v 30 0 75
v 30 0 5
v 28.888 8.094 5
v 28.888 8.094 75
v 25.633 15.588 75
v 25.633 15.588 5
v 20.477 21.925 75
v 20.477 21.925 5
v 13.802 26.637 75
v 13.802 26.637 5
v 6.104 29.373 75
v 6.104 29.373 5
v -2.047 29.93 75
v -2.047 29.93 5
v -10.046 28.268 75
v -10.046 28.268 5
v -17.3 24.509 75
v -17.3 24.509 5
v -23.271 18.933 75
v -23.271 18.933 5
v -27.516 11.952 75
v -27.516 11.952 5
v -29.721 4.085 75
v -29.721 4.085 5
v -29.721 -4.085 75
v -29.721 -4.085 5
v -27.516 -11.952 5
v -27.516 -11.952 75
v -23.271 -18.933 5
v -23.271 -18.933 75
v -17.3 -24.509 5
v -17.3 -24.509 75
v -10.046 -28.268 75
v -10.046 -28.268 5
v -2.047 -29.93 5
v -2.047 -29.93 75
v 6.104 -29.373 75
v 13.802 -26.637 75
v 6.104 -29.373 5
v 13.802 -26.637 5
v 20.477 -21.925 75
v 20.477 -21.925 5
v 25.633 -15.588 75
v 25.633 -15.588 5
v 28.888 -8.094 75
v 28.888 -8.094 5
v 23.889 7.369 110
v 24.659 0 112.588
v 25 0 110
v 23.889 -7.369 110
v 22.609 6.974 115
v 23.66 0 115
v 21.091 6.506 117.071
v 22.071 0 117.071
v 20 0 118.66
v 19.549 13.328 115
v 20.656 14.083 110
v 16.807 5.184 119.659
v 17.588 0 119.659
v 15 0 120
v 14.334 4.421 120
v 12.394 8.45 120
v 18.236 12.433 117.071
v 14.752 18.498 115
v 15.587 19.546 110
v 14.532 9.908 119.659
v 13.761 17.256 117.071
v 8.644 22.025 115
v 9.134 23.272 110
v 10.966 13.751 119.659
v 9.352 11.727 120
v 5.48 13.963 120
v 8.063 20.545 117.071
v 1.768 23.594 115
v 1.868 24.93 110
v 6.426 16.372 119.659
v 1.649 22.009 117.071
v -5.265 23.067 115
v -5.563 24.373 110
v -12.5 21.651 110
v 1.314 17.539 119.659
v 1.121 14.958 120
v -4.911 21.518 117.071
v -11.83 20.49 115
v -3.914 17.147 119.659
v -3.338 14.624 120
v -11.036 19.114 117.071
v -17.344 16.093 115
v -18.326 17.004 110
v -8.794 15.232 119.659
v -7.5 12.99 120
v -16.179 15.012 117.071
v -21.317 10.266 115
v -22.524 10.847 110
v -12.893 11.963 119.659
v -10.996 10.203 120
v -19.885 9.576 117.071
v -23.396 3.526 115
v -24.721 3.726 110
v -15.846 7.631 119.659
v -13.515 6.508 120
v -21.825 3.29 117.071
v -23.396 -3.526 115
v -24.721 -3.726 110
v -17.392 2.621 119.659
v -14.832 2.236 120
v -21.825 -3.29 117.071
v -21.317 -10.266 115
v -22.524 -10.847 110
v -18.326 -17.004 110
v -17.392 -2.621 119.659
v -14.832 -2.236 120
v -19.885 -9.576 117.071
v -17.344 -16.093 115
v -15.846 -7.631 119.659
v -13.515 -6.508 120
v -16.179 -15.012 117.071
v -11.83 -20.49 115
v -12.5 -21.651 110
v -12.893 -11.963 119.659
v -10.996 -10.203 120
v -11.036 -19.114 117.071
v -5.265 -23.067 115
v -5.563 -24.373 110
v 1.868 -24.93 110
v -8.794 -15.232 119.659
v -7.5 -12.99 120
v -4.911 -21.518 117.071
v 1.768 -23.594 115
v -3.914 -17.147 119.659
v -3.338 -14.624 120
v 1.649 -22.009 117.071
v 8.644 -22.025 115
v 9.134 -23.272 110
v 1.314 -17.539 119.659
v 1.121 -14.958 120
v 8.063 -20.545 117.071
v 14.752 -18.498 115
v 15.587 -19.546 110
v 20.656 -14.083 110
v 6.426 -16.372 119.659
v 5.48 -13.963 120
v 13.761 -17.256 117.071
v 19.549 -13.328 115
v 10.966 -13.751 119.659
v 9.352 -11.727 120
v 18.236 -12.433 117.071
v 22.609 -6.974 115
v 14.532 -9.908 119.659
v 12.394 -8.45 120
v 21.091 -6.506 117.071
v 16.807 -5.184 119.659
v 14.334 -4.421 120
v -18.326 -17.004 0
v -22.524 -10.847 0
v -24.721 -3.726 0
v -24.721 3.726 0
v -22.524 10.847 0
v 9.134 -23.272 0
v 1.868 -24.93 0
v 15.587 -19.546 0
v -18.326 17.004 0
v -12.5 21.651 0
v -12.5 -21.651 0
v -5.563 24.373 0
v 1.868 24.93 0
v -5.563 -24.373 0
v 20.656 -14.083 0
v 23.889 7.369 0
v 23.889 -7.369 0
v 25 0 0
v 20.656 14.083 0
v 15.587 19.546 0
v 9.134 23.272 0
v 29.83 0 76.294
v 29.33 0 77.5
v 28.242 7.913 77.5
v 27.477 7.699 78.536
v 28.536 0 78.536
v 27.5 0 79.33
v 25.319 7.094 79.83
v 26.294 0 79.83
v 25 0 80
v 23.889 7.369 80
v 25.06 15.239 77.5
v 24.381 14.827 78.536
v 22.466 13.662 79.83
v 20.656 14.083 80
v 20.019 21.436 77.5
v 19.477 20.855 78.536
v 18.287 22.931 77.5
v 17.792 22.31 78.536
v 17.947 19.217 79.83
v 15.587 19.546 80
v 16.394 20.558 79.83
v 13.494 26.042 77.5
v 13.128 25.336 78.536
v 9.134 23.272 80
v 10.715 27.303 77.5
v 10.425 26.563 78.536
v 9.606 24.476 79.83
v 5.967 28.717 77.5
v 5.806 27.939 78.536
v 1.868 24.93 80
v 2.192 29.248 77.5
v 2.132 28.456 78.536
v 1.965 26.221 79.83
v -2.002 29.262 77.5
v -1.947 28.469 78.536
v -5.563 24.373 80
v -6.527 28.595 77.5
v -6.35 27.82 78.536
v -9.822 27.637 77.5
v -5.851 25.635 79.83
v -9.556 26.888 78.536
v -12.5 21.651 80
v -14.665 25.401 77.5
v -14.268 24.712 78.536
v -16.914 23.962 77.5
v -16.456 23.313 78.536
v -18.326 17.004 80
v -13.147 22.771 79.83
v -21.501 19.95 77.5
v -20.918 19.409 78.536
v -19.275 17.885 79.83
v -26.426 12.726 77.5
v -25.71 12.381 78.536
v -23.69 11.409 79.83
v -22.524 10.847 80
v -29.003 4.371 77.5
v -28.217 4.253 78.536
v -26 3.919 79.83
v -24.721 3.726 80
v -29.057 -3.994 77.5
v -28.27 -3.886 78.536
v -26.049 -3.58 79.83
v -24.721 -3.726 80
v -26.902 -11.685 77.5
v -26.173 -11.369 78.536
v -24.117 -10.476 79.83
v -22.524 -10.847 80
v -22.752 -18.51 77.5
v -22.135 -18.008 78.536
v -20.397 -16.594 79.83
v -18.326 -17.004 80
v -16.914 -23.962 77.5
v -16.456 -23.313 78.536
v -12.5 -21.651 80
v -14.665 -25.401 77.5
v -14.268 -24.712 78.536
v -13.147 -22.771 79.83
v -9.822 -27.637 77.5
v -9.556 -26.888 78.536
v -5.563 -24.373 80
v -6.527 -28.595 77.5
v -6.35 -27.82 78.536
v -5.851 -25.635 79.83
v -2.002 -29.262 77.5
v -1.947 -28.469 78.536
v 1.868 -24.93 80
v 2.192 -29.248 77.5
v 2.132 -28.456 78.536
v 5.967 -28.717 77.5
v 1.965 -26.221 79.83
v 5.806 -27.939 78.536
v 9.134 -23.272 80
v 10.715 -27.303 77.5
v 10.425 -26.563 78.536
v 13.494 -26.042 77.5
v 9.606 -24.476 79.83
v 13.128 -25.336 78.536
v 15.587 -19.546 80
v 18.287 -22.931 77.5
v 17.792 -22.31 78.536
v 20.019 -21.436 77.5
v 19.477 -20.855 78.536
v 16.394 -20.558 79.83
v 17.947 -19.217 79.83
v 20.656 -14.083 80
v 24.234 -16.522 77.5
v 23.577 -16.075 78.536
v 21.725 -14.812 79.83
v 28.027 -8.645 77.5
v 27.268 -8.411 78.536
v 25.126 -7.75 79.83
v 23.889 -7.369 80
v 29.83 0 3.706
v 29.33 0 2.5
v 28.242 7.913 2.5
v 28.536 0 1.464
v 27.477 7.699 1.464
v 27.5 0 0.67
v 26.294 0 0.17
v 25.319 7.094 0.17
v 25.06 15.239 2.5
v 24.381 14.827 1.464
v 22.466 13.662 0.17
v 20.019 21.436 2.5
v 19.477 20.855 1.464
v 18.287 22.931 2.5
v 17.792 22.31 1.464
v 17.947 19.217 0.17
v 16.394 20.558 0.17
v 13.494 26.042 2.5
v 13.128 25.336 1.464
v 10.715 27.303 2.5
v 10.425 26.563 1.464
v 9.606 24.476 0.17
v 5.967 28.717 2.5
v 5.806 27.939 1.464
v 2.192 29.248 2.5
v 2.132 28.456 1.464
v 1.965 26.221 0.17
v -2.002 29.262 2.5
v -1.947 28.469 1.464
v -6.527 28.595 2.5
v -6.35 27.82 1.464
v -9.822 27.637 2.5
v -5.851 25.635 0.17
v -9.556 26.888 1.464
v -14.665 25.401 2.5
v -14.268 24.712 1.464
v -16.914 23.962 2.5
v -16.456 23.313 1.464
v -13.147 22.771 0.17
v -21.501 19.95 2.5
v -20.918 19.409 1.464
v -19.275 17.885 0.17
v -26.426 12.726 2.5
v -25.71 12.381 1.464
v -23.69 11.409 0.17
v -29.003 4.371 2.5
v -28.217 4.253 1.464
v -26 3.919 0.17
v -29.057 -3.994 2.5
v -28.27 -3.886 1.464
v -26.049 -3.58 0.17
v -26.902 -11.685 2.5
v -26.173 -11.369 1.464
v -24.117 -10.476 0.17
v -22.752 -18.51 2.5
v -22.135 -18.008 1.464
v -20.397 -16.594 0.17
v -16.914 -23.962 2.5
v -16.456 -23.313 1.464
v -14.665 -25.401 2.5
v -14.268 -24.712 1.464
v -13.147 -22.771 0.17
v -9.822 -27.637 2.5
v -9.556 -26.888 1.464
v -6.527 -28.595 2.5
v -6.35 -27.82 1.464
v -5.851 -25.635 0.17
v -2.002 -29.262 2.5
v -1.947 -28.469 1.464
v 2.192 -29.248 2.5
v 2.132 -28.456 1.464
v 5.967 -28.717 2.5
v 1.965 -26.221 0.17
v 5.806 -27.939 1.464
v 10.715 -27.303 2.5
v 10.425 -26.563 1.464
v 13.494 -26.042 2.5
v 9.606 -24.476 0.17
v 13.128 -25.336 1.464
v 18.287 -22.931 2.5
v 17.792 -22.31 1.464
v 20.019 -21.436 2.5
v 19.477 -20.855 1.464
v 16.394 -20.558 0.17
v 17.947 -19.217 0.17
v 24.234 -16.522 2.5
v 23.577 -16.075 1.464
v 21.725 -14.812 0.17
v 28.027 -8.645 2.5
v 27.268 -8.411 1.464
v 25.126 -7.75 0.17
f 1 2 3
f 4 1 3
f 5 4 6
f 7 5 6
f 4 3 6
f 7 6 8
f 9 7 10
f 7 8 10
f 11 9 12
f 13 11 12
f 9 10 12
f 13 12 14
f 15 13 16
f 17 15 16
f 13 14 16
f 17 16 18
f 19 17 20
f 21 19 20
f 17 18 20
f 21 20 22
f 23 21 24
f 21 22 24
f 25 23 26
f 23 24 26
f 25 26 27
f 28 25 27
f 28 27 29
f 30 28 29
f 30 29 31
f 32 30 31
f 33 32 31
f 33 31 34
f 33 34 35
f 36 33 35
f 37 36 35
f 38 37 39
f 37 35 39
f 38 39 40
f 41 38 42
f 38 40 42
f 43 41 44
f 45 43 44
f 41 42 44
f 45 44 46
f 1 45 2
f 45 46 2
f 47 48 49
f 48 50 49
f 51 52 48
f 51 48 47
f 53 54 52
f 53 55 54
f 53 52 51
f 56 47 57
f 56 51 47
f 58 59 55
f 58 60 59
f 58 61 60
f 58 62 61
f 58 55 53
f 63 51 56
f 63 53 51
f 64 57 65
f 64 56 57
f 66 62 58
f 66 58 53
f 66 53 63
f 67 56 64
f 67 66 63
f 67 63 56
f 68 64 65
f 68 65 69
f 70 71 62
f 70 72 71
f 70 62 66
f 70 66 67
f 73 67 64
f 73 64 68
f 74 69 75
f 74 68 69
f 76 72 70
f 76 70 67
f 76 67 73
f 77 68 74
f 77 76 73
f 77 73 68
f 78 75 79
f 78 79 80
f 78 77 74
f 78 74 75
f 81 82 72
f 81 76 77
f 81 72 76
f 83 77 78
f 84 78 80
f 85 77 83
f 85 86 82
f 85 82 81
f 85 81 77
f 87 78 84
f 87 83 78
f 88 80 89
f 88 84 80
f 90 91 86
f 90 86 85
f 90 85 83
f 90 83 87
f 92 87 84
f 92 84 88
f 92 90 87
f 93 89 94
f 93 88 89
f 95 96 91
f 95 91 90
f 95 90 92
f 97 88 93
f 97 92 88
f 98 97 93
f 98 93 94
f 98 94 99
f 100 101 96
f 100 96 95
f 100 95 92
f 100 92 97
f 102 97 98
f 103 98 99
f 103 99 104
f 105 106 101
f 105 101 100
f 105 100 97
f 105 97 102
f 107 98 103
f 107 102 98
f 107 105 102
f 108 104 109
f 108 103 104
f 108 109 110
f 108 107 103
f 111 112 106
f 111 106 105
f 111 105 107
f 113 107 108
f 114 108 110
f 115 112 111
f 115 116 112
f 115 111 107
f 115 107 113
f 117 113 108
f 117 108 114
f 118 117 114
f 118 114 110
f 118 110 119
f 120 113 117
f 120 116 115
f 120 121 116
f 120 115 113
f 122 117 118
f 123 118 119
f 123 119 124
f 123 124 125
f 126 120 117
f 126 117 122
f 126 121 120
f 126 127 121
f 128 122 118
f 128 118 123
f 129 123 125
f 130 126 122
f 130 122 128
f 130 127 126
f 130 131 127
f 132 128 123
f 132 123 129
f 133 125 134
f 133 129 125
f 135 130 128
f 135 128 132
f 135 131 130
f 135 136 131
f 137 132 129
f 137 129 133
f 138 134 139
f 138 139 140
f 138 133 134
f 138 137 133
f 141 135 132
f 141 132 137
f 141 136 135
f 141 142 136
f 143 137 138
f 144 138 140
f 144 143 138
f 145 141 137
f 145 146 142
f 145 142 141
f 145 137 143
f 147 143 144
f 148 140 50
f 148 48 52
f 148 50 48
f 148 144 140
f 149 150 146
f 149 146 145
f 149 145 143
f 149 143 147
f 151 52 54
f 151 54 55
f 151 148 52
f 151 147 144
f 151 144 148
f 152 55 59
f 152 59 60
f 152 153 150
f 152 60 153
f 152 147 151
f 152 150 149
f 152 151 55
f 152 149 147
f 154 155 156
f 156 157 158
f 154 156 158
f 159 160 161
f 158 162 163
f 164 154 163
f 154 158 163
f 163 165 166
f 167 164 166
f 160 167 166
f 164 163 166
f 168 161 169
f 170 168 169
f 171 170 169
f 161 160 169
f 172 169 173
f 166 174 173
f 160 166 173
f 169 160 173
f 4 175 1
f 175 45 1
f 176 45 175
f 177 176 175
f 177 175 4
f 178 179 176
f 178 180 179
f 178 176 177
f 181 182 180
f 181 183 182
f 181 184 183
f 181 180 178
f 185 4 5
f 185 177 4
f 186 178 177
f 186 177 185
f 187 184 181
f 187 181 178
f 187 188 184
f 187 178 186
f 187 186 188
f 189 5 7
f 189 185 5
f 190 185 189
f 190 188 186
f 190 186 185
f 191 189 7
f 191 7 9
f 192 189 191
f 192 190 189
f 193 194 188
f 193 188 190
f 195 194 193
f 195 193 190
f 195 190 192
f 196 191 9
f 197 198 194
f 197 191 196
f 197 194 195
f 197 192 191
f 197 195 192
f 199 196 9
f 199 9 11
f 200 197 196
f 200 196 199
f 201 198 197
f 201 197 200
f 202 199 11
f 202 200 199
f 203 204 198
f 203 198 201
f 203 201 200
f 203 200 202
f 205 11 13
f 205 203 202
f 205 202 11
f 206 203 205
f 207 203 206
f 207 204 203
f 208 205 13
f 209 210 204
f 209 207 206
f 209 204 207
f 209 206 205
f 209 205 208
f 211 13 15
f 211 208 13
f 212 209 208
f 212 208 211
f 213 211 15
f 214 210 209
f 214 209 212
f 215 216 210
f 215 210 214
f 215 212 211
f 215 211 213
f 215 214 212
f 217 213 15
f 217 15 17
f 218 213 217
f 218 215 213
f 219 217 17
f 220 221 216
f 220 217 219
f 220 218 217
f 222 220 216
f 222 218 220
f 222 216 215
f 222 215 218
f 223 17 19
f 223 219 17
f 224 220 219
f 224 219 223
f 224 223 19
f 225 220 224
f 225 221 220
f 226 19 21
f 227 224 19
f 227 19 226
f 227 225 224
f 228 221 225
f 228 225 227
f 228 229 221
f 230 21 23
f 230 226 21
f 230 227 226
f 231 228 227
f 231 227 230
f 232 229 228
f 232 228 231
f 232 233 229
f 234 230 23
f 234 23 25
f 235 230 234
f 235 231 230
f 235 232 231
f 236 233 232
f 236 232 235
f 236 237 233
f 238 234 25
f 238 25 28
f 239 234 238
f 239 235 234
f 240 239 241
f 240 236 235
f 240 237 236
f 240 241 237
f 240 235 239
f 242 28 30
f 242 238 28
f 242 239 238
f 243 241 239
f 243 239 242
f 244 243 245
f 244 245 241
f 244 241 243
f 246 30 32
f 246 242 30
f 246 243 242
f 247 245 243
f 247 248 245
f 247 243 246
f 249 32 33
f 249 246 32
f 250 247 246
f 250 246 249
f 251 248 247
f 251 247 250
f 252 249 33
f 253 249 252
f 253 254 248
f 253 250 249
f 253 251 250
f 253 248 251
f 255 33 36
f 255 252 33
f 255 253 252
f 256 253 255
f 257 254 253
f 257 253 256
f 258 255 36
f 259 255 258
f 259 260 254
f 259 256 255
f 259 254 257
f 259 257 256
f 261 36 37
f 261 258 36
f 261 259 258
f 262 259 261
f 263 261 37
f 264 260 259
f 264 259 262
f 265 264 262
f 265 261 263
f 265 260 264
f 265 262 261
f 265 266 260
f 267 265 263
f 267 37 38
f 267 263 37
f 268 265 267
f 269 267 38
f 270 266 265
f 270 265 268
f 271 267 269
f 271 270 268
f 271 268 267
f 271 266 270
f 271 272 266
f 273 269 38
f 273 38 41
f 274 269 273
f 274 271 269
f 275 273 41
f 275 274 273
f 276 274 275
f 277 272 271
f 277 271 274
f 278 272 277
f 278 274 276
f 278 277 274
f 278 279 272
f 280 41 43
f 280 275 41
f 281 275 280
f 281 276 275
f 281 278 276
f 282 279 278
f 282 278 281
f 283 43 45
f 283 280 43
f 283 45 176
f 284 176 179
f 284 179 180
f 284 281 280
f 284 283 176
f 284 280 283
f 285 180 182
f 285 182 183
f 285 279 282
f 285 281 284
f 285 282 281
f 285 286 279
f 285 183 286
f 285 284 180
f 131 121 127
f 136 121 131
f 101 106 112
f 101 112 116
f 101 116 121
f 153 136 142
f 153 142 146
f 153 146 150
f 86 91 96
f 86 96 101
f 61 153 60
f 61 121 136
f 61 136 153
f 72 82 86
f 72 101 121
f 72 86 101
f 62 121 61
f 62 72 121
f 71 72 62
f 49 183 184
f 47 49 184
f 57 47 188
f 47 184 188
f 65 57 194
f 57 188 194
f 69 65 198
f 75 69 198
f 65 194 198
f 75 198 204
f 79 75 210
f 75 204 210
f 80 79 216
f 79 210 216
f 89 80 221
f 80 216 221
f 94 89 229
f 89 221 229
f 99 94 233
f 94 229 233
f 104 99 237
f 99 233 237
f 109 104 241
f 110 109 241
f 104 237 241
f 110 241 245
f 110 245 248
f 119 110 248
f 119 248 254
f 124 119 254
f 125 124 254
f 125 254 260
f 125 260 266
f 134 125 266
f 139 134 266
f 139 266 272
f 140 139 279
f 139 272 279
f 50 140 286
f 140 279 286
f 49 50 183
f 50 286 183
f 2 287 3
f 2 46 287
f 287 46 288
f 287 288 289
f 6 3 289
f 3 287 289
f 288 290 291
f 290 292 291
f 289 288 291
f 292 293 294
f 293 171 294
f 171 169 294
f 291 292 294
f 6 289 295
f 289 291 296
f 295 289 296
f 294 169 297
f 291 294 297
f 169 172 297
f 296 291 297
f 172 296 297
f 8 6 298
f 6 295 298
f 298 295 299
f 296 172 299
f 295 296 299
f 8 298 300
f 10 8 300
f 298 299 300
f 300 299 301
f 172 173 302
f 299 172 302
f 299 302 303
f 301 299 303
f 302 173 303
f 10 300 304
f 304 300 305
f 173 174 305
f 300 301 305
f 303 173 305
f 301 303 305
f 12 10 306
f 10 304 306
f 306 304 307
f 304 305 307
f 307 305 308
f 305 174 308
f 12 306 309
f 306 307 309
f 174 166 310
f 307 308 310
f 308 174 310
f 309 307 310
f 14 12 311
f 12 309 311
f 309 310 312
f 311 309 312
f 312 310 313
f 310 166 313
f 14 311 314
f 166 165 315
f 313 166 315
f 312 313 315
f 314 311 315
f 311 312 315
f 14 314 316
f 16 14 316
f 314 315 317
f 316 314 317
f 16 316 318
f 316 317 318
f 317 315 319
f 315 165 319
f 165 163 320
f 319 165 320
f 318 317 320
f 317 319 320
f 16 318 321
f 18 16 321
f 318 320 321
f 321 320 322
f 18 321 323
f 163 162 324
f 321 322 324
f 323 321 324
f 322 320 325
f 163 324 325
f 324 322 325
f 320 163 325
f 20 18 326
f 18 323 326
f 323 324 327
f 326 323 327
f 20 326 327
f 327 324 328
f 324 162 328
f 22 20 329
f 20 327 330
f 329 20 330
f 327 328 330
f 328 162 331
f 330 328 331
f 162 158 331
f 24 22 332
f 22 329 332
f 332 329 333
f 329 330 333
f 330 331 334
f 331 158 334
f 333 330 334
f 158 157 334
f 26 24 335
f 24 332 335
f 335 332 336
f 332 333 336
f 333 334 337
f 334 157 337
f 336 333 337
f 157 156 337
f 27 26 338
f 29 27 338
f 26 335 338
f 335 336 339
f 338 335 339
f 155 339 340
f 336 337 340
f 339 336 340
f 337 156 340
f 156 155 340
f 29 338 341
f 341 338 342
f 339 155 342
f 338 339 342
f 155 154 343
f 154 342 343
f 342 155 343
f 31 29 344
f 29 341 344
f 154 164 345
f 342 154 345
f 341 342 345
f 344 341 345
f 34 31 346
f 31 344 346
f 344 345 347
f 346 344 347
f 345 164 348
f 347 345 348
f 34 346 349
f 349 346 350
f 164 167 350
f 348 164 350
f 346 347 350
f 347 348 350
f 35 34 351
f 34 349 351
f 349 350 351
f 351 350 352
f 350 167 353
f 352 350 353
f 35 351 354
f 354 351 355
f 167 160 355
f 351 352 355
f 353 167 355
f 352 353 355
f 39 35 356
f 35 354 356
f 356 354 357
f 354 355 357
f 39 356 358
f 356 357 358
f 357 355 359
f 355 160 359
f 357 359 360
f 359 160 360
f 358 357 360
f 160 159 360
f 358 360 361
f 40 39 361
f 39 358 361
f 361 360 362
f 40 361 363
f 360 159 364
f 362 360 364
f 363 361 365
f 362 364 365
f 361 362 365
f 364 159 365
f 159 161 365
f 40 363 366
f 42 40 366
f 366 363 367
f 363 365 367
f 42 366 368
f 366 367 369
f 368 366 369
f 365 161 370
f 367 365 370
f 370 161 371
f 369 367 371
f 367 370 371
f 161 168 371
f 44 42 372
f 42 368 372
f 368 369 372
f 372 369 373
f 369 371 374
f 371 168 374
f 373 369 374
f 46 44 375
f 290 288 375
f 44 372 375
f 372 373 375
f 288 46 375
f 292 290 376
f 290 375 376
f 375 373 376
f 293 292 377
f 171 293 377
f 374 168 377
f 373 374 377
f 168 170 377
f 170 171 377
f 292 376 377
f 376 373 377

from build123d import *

# Parameters (mm, degrees)
F0_R     = 30
F1_DEPTH = 80
F2_R     = 25
F3_DEPTH = 40
F4_R     = 4.99999
F5_R     = 5
F6_R     = 10


# Not quite as in the source:
# - a fillet or chamfer is up to 0.001 mm smaller than in the source, because OpenCascade refuses the exact size


with BuildPart() as f1:
    # F0 (on Top) → F1 (new body)
    with BuildSketch(Plane.XY):
        Circle(F0_R)
    extrude(amount=F1_DEPTH)

    # F2 (on face) → F3 (join)
    with BuildSketch(Plane.XY.offset(80)):
        Circle(F2_R)
    extrude(amount=F3_DEPTH)

    # F4 (radius 5 in the source; OpenCascade refuses exactly that, so slightly less here)
    f4_edges = [f1.edges().sort_by_distance(p)[0] for p in [
        (-30, 0, 80),
    ]]
    fillet(f4_edges, radius=F4_R)

    # F5
    f5_edges = [f1.edges().sort_by_distance(p)[0] for p in [
        (-30, 0, 0),
    ]]
    fillet(f5_edges, radius=F5_R)

    # F6
    f6_edges = [f1.edges().sort_by_distance(p)[0] for p in [
        (-25, 0, 120),
    ]]
    fillet(f6_edges, radius=F6_R)


solid = f1.part
